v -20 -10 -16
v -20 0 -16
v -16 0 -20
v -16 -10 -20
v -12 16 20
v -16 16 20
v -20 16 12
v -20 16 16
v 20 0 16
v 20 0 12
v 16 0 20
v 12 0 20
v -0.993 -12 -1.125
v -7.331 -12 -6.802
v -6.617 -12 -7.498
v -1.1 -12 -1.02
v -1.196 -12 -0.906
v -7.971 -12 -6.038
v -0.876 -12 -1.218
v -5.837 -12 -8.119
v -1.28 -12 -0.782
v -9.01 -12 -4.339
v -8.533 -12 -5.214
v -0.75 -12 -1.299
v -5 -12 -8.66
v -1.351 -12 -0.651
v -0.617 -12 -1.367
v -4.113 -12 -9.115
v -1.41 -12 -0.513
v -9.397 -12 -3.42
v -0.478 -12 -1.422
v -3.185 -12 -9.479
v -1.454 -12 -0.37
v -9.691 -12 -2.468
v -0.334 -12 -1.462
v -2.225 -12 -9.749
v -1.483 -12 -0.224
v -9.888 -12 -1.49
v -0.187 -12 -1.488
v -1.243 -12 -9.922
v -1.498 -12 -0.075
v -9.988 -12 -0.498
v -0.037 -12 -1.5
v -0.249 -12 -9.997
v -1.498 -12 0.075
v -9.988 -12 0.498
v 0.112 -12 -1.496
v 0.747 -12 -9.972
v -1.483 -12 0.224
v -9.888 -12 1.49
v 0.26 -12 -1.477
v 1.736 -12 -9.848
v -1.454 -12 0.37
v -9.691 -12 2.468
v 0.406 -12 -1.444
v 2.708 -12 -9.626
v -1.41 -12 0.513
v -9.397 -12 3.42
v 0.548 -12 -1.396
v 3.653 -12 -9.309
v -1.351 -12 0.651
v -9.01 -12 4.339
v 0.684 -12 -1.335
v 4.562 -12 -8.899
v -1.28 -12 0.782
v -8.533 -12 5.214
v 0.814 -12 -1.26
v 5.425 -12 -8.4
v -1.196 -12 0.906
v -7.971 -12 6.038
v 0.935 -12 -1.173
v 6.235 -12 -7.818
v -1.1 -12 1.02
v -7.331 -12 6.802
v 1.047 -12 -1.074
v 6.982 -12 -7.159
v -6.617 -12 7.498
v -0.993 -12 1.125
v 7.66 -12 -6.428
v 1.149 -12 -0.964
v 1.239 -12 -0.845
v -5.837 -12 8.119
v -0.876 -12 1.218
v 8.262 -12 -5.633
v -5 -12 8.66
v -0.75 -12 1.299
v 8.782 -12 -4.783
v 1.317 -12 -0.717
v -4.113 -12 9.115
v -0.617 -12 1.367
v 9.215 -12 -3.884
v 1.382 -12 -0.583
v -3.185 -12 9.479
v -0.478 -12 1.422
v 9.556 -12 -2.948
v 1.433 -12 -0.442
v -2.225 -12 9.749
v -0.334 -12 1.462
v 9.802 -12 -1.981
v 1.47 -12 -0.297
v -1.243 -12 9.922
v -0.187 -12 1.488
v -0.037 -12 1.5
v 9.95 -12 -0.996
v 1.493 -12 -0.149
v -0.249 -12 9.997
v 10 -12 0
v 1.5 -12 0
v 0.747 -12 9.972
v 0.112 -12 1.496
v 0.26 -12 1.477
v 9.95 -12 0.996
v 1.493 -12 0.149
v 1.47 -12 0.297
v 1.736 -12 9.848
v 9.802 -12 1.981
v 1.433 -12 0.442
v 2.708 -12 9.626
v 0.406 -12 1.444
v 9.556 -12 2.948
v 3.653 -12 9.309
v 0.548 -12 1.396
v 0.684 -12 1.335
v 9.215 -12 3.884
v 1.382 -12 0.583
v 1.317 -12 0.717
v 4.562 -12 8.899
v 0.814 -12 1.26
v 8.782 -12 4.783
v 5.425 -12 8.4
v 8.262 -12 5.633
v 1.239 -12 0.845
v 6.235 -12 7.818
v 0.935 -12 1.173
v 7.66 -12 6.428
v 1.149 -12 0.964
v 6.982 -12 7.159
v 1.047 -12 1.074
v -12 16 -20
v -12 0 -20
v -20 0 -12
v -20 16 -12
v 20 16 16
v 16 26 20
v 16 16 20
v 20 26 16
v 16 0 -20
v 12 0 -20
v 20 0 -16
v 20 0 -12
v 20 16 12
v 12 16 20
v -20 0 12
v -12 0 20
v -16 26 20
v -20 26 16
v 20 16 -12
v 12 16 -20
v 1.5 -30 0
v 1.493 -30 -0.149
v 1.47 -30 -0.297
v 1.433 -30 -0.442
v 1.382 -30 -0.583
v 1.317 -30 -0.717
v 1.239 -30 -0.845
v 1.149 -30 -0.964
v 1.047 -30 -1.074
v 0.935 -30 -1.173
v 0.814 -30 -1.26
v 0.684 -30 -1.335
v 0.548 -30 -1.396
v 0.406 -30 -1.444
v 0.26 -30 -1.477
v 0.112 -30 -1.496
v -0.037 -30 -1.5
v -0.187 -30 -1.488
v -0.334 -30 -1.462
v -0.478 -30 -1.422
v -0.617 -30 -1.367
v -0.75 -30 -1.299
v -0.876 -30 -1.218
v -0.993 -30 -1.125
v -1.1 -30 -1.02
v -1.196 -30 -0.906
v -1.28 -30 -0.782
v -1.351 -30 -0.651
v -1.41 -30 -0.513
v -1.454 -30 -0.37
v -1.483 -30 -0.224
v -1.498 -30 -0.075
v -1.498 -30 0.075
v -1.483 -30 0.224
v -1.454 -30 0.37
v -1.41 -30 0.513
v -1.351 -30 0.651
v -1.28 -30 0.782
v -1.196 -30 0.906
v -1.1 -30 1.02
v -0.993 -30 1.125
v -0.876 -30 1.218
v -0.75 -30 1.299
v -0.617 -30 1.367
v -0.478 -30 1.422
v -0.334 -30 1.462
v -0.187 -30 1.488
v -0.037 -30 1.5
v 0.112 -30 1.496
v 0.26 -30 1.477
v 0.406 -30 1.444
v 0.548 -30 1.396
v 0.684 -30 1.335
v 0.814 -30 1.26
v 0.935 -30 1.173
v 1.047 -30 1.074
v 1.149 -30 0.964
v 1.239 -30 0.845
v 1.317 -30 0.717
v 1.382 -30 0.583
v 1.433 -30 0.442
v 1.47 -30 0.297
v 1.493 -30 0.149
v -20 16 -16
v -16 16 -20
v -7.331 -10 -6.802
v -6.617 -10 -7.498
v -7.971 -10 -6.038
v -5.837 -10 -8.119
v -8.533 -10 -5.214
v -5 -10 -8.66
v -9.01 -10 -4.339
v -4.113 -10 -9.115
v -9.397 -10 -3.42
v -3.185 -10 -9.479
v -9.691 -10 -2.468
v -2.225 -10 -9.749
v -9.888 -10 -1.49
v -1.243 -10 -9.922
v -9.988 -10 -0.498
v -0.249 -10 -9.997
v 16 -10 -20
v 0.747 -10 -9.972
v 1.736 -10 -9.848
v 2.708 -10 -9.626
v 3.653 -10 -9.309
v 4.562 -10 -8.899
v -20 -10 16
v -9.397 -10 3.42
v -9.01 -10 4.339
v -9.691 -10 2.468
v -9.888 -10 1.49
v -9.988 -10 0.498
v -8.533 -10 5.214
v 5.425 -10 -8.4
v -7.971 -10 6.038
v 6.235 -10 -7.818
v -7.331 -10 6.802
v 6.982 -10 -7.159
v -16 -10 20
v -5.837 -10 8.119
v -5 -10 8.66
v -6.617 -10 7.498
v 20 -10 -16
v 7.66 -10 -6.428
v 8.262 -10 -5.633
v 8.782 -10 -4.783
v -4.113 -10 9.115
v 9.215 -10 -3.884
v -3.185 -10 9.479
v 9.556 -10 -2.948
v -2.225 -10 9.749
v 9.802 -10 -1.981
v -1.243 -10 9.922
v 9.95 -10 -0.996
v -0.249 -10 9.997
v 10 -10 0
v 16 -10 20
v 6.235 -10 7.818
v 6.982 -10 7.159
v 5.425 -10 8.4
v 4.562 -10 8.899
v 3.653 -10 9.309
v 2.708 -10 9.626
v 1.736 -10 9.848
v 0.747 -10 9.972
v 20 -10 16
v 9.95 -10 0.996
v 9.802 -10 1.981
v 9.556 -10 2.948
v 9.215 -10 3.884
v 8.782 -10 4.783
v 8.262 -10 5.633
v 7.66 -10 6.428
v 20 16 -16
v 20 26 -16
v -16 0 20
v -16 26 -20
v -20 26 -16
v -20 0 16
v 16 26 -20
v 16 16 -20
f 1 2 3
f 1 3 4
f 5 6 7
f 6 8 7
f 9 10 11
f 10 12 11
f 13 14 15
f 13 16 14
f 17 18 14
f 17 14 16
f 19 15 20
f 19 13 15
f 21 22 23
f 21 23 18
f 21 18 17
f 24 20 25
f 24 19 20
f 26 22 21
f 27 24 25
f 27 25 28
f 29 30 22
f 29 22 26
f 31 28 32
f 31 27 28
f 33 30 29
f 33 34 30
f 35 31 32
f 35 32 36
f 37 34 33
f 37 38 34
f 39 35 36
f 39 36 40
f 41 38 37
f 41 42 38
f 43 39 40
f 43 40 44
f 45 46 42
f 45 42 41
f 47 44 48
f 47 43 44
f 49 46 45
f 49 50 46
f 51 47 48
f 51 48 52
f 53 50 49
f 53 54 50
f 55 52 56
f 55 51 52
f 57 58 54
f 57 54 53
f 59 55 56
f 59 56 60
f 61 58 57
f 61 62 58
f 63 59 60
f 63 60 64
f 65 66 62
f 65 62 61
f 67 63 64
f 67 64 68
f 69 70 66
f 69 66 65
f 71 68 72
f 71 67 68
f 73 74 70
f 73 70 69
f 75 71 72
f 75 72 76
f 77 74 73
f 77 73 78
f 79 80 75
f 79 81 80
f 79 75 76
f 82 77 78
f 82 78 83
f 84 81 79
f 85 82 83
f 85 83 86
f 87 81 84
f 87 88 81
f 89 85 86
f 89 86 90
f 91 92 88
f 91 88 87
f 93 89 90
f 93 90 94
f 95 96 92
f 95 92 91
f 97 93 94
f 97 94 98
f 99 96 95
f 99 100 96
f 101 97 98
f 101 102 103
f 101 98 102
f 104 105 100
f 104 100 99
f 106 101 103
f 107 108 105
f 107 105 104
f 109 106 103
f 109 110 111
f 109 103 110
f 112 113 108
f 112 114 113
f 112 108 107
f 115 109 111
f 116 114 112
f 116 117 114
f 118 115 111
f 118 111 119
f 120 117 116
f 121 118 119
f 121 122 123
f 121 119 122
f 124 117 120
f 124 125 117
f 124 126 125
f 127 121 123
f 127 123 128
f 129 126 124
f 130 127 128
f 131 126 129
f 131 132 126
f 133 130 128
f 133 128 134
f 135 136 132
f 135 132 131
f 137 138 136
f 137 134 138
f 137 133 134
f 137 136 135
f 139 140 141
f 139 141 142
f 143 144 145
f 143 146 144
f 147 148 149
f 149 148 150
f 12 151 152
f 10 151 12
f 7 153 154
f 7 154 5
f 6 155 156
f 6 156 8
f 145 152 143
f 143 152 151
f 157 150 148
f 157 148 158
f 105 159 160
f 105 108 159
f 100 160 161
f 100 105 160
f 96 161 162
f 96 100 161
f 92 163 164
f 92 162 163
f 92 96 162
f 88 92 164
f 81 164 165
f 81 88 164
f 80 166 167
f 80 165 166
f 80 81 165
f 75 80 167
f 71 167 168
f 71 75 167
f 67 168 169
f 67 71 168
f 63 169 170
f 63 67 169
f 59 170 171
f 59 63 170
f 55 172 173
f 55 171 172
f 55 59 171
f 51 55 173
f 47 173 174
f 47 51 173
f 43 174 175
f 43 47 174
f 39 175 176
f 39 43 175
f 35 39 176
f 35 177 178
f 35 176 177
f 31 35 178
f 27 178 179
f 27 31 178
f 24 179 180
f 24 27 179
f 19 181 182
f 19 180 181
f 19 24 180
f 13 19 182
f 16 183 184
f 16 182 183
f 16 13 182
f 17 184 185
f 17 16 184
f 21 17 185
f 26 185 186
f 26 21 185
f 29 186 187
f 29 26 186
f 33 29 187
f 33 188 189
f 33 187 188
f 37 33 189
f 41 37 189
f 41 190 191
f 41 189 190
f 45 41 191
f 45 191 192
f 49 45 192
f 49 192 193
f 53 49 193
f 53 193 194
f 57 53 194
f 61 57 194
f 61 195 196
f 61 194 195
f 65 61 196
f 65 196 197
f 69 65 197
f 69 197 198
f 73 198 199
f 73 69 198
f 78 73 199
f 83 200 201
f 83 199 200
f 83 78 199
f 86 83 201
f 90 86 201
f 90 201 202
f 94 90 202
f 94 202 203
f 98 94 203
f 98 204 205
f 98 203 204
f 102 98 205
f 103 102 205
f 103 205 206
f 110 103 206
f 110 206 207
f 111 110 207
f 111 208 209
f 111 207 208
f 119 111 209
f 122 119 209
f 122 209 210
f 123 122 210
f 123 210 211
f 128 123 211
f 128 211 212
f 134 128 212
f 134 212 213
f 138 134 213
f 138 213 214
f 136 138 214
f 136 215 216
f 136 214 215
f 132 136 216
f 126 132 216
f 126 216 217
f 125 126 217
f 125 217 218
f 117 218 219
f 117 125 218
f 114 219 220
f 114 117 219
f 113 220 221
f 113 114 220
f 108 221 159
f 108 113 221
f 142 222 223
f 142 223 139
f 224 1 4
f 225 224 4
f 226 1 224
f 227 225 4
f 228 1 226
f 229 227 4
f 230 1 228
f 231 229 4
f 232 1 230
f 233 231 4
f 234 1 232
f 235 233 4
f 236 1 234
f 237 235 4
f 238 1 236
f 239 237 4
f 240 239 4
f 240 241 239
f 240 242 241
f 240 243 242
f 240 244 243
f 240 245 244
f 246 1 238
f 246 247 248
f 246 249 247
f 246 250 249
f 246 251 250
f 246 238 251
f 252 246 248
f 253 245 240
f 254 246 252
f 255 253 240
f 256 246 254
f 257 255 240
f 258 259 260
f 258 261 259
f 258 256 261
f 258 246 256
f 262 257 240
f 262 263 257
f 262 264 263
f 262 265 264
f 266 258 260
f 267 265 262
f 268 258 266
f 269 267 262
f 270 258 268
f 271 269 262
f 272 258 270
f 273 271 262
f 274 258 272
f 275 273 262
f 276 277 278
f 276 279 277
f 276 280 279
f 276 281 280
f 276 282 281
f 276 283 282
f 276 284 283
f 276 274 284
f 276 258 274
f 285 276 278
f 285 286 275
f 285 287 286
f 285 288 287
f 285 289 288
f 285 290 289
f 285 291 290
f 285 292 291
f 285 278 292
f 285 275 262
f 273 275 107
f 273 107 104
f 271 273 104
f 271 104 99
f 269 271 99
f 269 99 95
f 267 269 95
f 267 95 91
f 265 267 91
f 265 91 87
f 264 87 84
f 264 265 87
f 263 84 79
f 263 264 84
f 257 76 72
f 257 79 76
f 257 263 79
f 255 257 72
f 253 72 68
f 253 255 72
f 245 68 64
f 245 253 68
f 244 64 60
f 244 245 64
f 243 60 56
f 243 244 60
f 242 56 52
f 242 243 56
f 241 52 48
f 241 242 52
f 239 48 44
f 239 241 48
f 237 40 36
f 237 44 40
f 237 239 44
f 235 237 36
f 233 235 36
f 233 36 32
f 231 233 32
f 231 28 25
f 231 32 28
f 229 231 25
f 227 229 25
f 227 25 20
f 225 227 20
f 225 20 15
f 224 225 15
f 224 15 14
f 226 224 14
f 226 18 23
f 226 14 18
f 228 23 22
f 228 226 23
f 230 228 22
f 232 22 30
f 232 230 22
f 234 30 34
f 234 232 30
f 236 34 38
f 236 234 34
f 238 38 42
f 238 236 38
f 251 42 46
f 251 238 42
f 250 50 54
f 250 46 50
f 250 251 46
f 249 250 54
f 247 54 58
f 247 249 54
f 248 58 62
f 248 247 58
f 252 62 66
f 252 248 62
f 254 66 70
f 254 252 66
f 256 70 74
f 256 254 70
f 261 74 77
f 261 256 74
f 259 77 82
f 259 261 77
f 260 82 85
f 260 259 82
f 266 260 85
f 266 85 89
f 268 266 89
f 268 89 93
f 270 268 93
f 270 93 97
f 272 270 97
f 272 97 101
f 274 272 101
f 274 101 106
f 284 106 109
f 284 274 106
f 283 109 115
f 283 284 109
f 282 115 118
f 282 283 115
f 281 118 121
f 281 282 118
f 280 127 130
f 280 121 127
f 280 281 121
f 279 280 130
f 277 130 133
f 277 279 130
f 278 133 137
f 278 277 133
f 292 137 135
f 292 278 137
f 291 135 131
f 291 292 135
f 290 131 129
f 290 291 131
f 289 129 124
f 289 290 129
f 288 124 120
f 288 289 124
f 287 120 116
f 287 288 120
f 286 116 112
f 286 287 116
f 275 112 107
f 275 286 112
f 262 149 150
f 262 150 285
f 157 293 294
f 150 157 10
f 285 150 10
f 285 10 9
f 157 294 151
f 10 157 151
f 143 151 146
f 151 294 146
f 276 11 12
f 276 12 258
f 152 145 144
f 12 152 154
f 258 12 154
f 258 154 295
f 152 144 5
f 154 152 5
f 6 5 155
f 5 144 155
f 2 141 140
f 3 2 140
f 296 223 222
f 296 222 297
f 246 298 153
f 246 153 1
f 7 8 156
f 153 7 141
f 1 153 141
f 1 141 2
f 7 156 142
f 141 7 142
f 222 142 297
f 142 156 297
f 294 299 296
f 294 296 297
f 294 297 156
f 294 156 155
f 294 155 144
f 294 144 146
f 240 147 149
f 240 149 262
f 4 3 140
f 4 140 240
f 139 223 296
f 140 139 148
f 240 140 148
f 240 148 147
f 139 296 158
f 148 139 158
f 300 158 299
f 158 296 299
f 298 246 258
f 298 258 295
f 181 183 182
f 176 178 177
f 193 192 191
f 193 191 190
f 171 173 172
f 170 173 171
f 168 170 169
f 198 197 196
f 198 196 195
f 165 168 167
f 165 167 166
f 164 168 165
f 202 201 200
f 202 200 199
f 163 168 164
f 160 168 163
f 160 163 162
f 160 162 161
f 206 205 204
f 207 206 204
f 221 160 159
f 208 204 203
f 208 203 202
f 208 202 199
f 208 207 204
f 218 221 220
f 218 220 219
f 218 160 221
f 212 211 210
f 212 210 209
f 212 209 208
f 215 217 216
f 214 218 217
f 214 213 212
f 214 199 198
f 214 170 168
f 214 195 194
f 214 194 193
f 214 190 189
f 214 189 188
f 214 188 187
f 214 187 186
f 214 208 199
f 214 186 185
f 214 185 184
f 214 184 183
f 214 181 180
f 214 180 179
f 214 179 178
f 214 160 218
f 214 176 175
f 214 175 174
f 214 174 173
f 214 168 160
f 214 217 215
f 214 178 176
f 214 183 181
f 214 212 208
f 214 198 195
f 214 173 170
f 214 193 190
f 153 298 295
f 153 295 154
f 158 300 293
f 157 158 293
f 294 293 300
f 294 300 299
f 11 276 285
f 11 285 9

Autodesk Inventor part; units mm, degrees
ref_plane "YZ Plane" through (0, 0, 0) normal (1, 0, 0) x (0, 1, 0)
ref_plane "XZ Plane" through (0, 0, 0) normal (0, 1, 0) x (-1, 0, 0)
ref_plane "XY Plane" through (0, 0, 0) normal (0, 0, 1) x (1, 0, 0)
sketch "Esquisse1" plane through (0, 0, 0) normal (0, 1, 0) x (-1, 0, 0)
  line L0 (-20, 20) -> (20, 20)
  line L1 (20, 20) -> (20, -20)
  line L2 (20, -20) -> (-20, -20)
  line L3 (-20, -20) -> (-20, 20)
  line L4 (-20, 20) -> (20, -20) construction
  line L5 (20, 20) -> (-20, -20) construction
  point P0 (0, 0)
  dimension "d0" = 40
  dimension "d1" = 40
extrude "Extrusion1" add sketch "Esquisse1" along normal blind 16
chamfer "Chanfrein1" distance 8 angle 45 4 edges at (-20, 8, 20) (20, 8, 20) (20, 8, -20) (-20, 8, -20)
sketch "Esquisse2" plane through (0, 16, 0) normal (0, 1, 0) x (1, 0, 0)
  line L0 (-20, -20) -> (20, -20)
  line L1 (20, -20) -> (20, 20)
  line L2 (20, 20) -> (-20, 20)
  line L3 (-20, 20) -> (-20, -20)
  line L4 (-20, -20) -> (20, 20) construction
  line L5 (20, -20) -> (-20, 20) construction
  point P0 (0, 0)
  dimension "d7" = 40
extrude "Extrusion2" add sketch "Esquisse2" along normal blind 10
chamfer "Chanfrein2" distance 4 angle 45 4 edges at (20, 21, -20) (20, 21, 20) (-20, 21, 20) (-20, 21, -20)
sketch "Esquisse3" plane through (0, 0, 0) normal (0, -1, 0) x (1, 0, 0)
  line L0 (20, 20) -> (-20, 20)
  line L1 (-20, 20) -> (-20, -20)
  line L2 (-20, -20) -> (20, -20)
  line L3 (20, -20) -> (20, 20)
  line L4 (20, 20) -> (-20, -20) construction
  line L5 (-20, 20) -> (20, -20) construction
  point P0 (0, 0)
  dimension "d13" = 40
  dimension "d14" = 40
extrude "Extrusion3" add sketch "Esquisse3" along normal blind 10
chamfer "Chanfrein3" distance 4 angle 45 4 edges at (-20, -5, 20) (20, -5, 20) (20, -5, -20) (-20, -5, -20)
sketch "Esquisse4" plane through (0, -10, 0) normal (0, -1, 0) x (1, 0, 0)
  circle A0 centre (0, 0) radius 10
  dimension "d20" = 20
extrude "Extrusion4" add sketch "Esquisse4" along normal blind 2
sketch "Esquisse5" plane through (0, -12, 0) normal (0, -1, 0) x (1, 0, 0)
  circle A0 centre (0, 0) radius 1.5
  dimension "d23" = 3
extrude "Extrusion5" add sketch "Esquisse5" along normal blind 18
sketch "Esquisse6" plane through (12, 16, 20) normal (0, 0, 1) x (1, 0, 0)
  line L0 (0, -16) -> (0, 0) projected
  line L1 (-24, 0) -> (-24, -16) projected
  line L2 (0, 0) -> (-24, 0)
  line L3 (-28, -16) -> (-24, -16) projected
  line L4 (0, -16) -> (-24, -16)
  point P0 (-12, -16)
sketch "Esquisse7" plane through (20, 16, -12) normal (1, 0, 0) x (0, 0, -1)
  line L0 (0, 0) -> (-25.6172, 0)
  line L1 (0, -16) -> (-25.6172, -16)
  point P0 (-12, -16)
sketch "Esquisse8" plane through (-12, 16, -20) normal (0, 0, -1) x (-1, 0, 0)
  line L0 (0, 0) -> (0, -16) projected
  line L1 (-24, -16) -> (-24, 0) projected
  line L2 (0, 0) -> (-24, 0)
  line L3 (4, -16) -> (0, -16) projected
  line L4 (0, -16) -> (-24, -16)
  point P0 (-12, -16)
sketch "Esquisse9" plane through (-20, 16, 12) normal (-1, 0, 0) x (0, 0, 1)
  line L0 (0, 0) -> (-24.1988, 0)
  line L1 (0, -16) -> (-24.1988, -16)
  point P0 (-12, -16)
properties part number "Moteur courroie"
